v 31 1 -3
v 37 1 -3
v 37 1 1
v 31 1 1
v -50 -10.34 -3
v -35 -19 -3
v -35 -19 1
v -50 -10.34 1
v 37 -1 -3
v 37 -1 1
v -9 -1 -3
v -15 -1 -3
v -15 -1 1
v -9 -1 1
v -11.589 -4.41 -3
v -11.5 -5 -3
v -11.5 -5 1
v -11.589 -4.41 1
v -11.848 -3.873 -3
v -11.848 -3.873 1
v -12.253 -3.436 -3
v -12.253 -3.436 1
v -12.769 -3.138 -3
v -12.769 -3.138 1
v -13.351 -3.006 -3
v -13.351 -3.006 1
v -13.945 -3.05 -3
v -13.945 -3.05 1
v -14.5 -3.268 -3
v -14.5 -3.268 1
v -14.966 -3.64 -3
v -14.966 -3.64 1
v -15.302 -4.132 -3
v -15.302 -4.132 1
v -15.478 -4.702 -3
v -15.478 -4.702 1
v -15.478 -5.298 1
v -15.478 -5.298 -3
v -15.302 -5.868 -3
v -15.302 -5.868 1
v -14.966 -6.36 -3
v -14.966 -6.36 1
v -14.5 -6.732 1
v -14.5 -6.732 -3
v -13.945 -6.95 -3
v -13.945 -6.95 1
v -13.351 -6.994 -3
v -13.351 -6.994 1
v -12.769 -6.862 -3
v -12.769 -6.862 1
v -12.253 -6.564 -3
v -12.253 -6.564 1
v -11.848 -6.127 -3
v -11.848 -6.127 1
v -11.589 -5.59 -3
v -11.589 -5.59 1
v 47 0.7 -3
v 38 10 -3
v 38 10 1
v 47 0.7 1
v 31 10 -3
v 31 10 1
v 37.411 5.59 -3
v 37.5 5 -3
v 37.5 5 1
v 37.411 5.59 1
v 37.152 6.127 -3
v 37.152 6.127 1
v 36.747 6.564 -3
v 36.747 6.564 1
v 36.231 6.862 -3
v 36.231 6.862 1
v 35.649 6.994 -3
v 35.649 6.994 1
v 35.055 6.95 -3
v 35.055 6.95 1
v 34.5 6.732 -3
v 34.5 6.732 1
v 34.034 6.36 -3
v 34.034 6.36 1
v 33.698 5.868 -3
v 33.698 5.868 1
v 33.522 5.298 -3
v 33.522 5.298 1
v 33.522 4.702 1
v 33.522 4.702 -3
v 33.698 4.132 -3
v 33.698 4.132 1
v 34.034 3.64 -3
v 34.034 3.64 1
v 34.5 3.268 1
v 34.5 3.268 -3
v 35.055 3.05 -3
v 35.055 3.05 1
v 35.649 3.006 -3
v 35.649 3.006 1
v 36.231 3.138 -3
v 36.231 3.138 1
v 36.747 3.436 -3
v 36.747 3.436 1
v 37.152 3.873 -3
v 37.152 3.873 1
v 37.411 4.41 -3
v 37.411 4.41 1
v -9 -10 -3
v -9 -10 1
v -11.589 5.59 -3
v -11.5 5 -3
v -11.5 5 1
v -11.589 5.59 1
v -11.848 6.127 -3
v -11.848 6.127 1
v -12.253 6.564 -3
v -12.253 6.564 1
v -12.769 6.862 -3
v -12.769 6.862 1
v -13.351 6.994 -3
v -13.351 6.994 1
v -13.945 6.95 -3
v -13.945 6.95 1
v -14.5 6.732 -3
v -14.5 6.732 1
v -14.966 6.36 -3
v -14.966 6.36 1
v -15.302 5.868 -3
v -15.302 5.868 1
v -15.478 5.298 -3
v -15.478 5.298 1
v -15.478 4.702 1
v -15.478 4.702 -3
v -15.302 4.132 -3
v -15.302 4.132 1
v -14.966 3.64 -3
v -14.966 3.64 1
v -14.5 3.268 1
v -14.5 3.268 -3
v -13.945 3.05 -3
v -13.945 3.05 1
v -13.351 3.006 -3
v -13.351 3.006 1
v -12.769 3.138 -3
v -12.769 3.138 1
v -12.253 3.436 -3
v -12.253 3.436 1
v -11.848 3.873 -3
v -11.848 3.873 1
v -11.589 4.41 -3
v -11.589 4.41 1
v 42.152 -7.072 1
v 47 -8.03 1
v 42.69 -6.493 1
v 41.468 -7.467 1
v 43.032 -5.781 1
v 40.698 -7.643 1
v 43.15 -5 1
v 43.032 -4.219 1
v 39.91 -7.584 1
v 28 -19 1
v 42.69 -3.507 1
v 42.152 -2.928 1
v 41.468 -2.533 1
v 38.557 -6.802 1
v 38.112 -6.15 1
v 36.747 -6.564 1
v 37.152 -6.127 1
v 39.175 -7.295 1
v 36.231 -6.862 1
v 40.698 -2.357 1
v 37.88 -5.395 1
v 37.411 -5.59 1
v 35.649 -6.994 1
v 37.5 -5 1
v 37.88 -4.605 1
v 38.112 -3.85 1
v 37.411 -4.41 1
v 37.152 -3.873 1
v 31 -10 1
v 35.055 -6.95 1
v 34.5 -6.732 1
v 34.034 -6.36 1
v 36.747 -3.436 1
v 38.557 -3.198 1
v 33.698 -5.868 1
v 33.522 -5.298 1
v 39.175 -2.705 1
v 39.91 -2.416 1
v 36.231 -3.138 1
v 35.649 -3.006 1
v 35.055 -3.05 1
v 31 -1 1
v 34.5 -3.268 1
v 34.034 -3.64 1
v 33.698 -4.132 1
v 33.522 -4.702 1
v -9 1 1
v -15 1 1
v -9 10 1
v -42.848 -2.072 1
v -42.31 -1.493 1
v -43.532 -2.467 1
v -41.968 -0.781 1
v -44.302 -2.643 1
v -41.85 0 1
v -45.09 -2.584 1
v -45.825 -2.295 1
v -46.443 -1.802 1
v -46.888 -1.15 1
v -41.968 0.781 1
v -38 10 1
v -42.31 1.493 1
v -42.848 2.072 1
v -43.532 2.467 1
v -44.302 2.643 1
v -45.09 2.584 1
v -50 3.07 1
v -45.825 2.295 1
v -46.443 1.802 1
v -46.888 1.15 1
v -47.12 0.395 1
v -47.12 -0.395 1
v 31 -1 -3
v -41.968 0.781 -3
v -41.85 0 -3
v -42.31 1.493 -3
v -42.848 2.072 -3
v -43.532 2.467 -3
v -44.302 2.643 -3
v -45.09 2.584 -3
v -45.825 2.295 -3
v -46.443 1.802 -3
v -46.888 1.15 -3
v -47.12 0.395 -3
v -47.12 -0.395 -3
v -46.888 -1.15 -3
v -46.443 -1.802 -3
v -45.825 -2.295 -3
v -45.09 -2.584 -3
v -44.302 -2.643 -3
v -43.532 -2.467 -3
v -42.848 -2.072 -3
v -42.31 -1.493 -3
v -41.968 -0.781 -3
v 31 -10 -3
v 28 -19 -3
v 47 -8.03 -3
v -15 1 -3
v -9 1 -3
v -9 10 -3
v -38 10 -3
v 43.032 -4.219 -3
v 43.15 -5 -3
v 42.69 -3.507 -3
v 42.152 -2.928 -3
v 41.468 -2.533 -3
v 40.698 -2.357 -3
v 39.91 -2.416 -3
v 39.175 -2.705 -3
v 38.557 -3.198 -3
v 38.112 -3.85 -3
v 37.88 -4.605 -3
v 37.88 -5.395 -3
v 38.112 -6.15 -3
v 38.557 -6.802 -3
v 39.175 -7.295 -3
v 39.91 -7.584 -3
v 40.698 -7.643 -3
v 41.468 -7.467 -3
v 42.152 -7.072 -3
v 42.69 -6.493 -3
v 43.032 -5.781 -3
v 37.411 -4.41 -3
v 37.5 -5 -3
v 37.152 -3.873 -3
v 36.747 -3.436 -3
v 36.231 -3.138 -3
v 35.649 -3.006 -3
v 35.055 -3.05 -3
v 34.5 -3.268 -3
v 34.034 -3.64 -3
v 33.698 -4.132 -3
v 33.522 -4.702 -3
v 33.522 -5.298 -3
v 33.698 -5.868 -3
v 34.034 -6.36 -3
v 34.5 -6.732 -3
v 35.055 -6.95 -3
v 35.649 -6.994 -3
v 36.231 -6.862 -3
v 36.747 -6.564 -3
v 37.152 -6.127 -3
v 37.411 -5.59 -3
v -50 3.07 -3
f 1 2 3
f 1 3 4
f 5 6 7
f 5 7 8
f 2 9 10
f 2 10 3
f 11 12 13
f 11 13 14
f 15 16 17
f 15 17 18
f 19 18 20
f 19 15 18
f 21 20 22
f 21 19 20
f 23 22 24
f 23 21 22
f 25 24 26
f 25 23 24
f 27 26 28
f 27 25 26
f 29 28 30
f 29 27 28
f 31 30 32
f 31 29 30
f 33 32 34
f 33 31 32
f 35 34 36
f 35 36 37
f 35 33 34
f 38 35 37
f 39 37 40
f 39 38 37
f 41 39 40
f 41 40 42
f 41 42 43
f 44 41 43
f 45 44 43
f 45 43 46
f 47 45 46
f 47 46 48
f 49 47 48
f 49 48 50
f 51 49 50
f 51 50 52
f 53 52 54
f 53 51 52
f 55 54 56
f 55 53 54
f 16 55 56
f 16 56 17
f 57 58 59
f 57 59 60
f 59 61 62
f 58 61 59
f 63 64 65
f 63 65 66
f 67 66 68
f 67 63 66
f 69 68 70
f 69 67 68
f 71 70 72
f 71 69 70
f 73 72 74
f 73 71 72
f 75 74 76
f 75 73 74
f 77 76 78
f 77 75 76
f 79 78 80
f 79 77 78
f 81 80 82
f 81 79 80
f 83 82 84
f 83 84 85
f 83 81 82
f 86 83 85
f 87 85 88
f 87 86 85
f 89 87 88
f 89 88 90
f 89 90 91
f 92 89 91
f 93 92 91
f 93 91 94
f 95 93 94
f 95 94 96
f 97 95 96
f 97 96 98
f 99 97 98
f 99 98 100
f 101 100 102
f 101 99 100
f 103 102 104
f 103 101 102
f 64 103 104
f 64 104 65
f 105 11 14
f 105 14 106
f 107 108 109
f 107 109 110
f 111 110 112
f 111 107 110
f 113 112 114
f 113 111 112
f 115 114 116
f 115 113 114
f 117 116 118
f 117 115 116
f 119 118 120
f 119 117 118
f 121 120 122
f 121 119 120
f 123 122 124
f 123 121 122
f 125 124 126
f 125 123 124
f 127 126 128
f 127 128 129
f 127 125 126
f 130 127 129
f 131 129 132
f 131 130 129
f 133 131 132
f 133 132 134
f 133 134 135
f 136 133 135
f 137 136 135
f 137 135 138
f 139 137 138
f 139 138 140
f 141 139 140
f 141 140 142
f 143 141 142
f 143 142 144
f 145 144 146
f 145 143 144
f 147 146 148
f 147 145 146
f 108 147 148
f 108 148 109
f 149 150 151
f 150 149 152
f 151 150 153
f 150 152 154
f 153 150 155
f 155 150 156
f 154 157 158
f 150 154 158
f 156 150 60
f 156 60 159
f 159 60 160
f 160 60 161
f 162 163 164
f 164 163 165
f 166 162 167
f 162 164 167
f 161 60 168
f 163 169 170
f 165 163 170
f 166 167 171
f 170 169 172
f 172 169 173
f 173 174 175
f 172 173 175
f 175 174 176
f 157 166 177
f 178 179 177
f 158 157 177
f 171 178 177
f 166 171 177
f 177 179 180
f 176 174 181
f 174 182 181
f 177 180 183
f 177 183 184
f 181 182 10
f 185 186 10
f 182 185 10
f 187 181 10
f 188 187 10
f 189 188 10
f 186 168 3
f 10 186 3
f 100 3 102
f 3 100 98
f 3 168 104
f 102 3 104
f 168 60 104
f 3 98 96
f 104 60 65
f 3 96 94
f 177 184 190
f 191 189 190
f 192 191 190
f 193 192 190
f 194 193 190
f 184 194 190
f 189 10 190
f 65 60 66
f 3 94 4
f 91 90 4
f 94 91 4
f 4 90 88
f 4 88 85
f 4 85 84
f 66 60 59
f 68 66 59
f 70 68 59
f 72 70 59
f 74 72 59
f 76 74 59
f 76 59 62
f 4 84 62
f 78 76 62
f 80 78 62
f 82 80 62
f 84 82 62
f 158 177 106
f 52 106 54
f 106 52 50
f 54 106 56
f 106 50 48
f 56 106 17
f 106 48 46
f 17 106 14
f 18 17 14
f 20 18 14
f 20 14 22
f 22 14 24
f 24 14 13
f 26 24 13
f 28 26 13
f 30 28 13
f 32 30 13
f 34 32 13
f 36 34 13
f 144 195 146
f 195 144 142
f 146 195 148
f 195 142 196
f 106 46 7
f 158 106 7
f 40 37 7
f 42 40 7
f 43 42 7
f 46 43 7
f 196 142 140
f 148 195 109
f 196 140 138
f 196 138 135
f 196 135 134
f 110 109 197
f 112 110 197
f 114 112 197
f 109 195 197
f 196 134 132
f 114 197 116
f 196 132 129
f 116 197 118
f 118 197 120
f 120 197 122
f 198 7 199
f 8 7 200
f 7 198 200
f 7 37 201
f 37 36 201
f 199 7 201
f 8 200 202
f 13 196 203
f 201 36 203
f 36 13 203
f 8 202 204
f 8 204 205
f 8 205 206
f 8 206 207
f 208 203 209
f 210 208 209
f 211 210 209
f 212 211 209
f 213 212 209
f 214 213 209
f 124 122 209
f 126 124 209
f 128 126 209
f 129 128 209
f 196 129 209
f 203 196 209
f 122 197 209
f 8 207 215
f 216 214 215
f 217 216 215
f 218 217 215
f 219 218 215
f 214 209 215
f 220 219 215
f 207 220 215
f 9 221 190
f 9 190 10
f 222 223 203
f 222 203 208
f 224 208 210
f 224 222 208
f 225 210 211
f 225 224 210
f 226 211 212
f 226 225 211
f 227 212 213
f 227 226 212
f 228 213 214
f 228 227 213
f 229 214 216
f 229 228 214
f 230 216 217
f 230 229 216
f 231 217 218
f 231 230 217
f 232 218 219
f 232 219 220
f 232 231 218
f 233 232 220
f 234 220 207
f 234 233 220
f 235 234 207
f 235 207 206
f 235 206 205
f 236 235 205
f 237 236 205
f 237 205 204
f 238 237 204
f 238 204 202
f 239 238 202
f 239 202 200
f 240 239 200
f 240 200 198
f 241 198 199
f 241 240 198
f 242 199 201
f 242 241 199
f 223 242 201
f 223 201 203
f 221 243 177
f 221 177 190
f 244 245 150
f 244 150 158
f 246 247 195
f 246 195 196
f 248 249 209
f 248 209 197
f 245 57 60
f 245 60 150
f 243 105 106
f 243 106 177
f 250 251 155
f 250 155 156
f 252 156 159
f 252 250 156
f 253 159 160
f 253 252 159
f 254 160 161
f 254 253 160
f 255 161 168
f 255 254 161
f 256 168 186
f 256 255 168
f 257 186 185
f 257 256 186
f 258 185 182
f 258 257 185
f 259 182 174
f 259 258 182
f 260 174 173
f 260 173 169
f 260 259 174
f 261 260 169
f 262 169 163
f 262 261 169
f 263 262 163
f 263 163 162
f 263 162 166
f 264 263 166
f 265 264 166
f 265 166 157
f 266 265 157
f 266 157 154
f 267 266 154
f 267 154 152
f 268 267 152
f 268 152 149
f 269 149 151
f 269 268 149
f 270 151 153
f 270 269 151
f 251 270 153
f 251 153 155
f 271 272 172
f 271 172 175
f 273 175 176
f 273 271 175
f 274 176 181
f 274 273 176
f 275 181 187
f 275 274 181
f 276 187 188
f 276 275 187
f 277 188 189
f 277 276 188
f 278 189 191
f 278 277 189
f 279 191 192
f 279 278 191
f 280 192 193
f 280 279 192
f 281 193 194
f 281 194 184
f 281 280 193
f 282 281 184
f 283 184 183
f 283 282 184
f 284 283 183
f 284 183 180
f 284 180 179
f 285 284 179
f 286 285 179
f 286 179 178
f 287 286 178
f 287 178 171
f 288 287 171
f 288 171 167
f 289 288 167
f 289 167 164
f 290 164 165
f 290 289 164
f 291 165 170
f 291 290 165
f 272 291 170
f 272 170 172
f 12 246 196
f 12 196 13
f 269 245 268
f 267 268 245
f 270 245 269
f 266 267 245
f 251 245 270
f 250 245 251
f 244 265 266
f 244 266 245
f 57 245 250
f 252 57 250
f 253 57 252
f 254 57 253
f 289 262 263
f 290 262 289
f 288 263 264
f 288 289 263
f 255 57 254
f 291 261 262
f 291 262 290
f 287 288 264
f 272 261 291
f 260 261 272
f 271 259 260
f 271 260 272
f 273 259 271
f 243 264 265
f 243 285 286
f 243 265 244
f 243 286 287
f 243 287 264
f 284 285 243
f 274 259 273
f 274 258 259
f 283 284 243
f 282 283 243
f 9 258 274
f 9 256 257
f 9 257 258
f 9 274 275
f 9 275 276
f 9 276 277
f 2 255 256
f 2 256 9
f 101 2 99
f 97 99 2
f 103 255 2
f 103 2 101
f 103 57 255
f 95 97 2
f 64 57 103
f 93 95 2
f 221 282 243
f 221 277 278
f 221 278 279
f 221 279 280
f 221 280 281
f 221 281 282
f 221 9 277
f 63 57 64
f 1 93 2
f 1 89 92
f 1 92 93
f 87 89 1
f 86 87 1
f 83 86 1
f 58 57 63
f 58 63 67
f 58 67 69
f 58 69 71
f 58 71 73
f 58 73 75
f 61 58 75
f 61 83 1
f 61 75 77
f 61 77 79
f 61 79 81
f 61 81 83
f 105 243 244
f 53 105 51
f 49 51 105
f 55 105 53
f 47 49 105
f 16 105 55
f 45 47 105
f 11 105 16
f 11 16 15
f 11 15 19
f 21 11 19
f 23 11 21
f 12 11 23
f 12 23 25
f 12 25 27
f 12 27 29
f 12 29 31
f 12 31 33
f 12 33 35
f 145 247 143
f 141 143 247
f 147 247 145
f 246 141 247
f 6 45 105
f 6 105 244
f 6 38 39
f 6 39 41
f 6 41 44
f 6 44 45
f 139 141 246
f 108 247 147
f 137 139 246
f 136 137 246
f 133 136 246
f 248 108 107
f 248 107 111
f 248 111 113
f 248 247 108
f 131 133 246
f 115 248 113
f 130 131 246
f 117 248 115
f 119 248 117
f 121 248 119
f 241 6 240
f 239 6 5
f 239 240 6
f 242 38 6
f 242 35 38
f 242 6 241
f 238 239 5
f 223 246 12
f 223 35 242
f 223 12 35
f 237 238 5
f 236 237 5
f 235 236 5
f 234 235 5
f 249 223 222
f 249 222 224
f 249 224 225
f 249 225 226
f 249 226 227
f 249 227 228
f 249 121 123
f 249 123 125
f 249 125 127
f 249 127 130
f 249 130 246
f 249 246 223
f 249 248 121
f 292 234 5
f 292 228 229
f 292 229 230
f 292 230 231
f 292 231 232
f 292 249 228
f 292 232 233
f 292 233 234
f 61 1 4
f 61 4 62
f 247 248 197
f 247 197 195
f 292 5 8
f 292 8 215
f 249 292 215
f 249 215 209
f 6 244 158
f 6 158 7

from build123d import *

# Parameters (mm, degrees)
SKETCH005_R   = 2
SKETCH005_R_2 = 2.65
PAD_DEPTH     = 4


with BuildPart() as part:
    # Sketch005 → Pad (new body)
    with BuildSketch(Plane.XY.offset(-3)):
        Polygon((-38, 10), (-9, 10), (-9, 1), (-15, 1), (-15, -1), (-9, -1), (-9, -10), (31, -10), (31, -1), (37, -1), (37, 1), (31, 1), (31, 10), (38, 10), (47, 0.7), (47, -8.030345), (28, -19), (-35, -19), (-50, -10.339746), (-50, 3.07), align=None)
        with Locations((-13.5, 5)):
            Circle(SKETCH005_R, mode=Mode.SUBTRACT)
        with Locations((-13.5, -5)):
            Circle(SKETCH005_R, mode=Mode.SUBTRACT)
        with Locations((35.5, 5)):
            Circle(SKETCH005_R, mode=Mode.SUBTRACT)
        with Locations((35.5, -5)):
            Circle(SKETCH005_R, mode=Mode.SUBTRACT)
        with Locations((-44.5, 0)):
            Circle(SKETCH005_R_2, mode=Mode.SUBTRACT)
        with Locations((40.5, -5)):
            Circle(SKETCH005_R_2, mode=Mode.SUBTRACT)
    extrude(amount=PAD_DEPTH)


solid = part.part
